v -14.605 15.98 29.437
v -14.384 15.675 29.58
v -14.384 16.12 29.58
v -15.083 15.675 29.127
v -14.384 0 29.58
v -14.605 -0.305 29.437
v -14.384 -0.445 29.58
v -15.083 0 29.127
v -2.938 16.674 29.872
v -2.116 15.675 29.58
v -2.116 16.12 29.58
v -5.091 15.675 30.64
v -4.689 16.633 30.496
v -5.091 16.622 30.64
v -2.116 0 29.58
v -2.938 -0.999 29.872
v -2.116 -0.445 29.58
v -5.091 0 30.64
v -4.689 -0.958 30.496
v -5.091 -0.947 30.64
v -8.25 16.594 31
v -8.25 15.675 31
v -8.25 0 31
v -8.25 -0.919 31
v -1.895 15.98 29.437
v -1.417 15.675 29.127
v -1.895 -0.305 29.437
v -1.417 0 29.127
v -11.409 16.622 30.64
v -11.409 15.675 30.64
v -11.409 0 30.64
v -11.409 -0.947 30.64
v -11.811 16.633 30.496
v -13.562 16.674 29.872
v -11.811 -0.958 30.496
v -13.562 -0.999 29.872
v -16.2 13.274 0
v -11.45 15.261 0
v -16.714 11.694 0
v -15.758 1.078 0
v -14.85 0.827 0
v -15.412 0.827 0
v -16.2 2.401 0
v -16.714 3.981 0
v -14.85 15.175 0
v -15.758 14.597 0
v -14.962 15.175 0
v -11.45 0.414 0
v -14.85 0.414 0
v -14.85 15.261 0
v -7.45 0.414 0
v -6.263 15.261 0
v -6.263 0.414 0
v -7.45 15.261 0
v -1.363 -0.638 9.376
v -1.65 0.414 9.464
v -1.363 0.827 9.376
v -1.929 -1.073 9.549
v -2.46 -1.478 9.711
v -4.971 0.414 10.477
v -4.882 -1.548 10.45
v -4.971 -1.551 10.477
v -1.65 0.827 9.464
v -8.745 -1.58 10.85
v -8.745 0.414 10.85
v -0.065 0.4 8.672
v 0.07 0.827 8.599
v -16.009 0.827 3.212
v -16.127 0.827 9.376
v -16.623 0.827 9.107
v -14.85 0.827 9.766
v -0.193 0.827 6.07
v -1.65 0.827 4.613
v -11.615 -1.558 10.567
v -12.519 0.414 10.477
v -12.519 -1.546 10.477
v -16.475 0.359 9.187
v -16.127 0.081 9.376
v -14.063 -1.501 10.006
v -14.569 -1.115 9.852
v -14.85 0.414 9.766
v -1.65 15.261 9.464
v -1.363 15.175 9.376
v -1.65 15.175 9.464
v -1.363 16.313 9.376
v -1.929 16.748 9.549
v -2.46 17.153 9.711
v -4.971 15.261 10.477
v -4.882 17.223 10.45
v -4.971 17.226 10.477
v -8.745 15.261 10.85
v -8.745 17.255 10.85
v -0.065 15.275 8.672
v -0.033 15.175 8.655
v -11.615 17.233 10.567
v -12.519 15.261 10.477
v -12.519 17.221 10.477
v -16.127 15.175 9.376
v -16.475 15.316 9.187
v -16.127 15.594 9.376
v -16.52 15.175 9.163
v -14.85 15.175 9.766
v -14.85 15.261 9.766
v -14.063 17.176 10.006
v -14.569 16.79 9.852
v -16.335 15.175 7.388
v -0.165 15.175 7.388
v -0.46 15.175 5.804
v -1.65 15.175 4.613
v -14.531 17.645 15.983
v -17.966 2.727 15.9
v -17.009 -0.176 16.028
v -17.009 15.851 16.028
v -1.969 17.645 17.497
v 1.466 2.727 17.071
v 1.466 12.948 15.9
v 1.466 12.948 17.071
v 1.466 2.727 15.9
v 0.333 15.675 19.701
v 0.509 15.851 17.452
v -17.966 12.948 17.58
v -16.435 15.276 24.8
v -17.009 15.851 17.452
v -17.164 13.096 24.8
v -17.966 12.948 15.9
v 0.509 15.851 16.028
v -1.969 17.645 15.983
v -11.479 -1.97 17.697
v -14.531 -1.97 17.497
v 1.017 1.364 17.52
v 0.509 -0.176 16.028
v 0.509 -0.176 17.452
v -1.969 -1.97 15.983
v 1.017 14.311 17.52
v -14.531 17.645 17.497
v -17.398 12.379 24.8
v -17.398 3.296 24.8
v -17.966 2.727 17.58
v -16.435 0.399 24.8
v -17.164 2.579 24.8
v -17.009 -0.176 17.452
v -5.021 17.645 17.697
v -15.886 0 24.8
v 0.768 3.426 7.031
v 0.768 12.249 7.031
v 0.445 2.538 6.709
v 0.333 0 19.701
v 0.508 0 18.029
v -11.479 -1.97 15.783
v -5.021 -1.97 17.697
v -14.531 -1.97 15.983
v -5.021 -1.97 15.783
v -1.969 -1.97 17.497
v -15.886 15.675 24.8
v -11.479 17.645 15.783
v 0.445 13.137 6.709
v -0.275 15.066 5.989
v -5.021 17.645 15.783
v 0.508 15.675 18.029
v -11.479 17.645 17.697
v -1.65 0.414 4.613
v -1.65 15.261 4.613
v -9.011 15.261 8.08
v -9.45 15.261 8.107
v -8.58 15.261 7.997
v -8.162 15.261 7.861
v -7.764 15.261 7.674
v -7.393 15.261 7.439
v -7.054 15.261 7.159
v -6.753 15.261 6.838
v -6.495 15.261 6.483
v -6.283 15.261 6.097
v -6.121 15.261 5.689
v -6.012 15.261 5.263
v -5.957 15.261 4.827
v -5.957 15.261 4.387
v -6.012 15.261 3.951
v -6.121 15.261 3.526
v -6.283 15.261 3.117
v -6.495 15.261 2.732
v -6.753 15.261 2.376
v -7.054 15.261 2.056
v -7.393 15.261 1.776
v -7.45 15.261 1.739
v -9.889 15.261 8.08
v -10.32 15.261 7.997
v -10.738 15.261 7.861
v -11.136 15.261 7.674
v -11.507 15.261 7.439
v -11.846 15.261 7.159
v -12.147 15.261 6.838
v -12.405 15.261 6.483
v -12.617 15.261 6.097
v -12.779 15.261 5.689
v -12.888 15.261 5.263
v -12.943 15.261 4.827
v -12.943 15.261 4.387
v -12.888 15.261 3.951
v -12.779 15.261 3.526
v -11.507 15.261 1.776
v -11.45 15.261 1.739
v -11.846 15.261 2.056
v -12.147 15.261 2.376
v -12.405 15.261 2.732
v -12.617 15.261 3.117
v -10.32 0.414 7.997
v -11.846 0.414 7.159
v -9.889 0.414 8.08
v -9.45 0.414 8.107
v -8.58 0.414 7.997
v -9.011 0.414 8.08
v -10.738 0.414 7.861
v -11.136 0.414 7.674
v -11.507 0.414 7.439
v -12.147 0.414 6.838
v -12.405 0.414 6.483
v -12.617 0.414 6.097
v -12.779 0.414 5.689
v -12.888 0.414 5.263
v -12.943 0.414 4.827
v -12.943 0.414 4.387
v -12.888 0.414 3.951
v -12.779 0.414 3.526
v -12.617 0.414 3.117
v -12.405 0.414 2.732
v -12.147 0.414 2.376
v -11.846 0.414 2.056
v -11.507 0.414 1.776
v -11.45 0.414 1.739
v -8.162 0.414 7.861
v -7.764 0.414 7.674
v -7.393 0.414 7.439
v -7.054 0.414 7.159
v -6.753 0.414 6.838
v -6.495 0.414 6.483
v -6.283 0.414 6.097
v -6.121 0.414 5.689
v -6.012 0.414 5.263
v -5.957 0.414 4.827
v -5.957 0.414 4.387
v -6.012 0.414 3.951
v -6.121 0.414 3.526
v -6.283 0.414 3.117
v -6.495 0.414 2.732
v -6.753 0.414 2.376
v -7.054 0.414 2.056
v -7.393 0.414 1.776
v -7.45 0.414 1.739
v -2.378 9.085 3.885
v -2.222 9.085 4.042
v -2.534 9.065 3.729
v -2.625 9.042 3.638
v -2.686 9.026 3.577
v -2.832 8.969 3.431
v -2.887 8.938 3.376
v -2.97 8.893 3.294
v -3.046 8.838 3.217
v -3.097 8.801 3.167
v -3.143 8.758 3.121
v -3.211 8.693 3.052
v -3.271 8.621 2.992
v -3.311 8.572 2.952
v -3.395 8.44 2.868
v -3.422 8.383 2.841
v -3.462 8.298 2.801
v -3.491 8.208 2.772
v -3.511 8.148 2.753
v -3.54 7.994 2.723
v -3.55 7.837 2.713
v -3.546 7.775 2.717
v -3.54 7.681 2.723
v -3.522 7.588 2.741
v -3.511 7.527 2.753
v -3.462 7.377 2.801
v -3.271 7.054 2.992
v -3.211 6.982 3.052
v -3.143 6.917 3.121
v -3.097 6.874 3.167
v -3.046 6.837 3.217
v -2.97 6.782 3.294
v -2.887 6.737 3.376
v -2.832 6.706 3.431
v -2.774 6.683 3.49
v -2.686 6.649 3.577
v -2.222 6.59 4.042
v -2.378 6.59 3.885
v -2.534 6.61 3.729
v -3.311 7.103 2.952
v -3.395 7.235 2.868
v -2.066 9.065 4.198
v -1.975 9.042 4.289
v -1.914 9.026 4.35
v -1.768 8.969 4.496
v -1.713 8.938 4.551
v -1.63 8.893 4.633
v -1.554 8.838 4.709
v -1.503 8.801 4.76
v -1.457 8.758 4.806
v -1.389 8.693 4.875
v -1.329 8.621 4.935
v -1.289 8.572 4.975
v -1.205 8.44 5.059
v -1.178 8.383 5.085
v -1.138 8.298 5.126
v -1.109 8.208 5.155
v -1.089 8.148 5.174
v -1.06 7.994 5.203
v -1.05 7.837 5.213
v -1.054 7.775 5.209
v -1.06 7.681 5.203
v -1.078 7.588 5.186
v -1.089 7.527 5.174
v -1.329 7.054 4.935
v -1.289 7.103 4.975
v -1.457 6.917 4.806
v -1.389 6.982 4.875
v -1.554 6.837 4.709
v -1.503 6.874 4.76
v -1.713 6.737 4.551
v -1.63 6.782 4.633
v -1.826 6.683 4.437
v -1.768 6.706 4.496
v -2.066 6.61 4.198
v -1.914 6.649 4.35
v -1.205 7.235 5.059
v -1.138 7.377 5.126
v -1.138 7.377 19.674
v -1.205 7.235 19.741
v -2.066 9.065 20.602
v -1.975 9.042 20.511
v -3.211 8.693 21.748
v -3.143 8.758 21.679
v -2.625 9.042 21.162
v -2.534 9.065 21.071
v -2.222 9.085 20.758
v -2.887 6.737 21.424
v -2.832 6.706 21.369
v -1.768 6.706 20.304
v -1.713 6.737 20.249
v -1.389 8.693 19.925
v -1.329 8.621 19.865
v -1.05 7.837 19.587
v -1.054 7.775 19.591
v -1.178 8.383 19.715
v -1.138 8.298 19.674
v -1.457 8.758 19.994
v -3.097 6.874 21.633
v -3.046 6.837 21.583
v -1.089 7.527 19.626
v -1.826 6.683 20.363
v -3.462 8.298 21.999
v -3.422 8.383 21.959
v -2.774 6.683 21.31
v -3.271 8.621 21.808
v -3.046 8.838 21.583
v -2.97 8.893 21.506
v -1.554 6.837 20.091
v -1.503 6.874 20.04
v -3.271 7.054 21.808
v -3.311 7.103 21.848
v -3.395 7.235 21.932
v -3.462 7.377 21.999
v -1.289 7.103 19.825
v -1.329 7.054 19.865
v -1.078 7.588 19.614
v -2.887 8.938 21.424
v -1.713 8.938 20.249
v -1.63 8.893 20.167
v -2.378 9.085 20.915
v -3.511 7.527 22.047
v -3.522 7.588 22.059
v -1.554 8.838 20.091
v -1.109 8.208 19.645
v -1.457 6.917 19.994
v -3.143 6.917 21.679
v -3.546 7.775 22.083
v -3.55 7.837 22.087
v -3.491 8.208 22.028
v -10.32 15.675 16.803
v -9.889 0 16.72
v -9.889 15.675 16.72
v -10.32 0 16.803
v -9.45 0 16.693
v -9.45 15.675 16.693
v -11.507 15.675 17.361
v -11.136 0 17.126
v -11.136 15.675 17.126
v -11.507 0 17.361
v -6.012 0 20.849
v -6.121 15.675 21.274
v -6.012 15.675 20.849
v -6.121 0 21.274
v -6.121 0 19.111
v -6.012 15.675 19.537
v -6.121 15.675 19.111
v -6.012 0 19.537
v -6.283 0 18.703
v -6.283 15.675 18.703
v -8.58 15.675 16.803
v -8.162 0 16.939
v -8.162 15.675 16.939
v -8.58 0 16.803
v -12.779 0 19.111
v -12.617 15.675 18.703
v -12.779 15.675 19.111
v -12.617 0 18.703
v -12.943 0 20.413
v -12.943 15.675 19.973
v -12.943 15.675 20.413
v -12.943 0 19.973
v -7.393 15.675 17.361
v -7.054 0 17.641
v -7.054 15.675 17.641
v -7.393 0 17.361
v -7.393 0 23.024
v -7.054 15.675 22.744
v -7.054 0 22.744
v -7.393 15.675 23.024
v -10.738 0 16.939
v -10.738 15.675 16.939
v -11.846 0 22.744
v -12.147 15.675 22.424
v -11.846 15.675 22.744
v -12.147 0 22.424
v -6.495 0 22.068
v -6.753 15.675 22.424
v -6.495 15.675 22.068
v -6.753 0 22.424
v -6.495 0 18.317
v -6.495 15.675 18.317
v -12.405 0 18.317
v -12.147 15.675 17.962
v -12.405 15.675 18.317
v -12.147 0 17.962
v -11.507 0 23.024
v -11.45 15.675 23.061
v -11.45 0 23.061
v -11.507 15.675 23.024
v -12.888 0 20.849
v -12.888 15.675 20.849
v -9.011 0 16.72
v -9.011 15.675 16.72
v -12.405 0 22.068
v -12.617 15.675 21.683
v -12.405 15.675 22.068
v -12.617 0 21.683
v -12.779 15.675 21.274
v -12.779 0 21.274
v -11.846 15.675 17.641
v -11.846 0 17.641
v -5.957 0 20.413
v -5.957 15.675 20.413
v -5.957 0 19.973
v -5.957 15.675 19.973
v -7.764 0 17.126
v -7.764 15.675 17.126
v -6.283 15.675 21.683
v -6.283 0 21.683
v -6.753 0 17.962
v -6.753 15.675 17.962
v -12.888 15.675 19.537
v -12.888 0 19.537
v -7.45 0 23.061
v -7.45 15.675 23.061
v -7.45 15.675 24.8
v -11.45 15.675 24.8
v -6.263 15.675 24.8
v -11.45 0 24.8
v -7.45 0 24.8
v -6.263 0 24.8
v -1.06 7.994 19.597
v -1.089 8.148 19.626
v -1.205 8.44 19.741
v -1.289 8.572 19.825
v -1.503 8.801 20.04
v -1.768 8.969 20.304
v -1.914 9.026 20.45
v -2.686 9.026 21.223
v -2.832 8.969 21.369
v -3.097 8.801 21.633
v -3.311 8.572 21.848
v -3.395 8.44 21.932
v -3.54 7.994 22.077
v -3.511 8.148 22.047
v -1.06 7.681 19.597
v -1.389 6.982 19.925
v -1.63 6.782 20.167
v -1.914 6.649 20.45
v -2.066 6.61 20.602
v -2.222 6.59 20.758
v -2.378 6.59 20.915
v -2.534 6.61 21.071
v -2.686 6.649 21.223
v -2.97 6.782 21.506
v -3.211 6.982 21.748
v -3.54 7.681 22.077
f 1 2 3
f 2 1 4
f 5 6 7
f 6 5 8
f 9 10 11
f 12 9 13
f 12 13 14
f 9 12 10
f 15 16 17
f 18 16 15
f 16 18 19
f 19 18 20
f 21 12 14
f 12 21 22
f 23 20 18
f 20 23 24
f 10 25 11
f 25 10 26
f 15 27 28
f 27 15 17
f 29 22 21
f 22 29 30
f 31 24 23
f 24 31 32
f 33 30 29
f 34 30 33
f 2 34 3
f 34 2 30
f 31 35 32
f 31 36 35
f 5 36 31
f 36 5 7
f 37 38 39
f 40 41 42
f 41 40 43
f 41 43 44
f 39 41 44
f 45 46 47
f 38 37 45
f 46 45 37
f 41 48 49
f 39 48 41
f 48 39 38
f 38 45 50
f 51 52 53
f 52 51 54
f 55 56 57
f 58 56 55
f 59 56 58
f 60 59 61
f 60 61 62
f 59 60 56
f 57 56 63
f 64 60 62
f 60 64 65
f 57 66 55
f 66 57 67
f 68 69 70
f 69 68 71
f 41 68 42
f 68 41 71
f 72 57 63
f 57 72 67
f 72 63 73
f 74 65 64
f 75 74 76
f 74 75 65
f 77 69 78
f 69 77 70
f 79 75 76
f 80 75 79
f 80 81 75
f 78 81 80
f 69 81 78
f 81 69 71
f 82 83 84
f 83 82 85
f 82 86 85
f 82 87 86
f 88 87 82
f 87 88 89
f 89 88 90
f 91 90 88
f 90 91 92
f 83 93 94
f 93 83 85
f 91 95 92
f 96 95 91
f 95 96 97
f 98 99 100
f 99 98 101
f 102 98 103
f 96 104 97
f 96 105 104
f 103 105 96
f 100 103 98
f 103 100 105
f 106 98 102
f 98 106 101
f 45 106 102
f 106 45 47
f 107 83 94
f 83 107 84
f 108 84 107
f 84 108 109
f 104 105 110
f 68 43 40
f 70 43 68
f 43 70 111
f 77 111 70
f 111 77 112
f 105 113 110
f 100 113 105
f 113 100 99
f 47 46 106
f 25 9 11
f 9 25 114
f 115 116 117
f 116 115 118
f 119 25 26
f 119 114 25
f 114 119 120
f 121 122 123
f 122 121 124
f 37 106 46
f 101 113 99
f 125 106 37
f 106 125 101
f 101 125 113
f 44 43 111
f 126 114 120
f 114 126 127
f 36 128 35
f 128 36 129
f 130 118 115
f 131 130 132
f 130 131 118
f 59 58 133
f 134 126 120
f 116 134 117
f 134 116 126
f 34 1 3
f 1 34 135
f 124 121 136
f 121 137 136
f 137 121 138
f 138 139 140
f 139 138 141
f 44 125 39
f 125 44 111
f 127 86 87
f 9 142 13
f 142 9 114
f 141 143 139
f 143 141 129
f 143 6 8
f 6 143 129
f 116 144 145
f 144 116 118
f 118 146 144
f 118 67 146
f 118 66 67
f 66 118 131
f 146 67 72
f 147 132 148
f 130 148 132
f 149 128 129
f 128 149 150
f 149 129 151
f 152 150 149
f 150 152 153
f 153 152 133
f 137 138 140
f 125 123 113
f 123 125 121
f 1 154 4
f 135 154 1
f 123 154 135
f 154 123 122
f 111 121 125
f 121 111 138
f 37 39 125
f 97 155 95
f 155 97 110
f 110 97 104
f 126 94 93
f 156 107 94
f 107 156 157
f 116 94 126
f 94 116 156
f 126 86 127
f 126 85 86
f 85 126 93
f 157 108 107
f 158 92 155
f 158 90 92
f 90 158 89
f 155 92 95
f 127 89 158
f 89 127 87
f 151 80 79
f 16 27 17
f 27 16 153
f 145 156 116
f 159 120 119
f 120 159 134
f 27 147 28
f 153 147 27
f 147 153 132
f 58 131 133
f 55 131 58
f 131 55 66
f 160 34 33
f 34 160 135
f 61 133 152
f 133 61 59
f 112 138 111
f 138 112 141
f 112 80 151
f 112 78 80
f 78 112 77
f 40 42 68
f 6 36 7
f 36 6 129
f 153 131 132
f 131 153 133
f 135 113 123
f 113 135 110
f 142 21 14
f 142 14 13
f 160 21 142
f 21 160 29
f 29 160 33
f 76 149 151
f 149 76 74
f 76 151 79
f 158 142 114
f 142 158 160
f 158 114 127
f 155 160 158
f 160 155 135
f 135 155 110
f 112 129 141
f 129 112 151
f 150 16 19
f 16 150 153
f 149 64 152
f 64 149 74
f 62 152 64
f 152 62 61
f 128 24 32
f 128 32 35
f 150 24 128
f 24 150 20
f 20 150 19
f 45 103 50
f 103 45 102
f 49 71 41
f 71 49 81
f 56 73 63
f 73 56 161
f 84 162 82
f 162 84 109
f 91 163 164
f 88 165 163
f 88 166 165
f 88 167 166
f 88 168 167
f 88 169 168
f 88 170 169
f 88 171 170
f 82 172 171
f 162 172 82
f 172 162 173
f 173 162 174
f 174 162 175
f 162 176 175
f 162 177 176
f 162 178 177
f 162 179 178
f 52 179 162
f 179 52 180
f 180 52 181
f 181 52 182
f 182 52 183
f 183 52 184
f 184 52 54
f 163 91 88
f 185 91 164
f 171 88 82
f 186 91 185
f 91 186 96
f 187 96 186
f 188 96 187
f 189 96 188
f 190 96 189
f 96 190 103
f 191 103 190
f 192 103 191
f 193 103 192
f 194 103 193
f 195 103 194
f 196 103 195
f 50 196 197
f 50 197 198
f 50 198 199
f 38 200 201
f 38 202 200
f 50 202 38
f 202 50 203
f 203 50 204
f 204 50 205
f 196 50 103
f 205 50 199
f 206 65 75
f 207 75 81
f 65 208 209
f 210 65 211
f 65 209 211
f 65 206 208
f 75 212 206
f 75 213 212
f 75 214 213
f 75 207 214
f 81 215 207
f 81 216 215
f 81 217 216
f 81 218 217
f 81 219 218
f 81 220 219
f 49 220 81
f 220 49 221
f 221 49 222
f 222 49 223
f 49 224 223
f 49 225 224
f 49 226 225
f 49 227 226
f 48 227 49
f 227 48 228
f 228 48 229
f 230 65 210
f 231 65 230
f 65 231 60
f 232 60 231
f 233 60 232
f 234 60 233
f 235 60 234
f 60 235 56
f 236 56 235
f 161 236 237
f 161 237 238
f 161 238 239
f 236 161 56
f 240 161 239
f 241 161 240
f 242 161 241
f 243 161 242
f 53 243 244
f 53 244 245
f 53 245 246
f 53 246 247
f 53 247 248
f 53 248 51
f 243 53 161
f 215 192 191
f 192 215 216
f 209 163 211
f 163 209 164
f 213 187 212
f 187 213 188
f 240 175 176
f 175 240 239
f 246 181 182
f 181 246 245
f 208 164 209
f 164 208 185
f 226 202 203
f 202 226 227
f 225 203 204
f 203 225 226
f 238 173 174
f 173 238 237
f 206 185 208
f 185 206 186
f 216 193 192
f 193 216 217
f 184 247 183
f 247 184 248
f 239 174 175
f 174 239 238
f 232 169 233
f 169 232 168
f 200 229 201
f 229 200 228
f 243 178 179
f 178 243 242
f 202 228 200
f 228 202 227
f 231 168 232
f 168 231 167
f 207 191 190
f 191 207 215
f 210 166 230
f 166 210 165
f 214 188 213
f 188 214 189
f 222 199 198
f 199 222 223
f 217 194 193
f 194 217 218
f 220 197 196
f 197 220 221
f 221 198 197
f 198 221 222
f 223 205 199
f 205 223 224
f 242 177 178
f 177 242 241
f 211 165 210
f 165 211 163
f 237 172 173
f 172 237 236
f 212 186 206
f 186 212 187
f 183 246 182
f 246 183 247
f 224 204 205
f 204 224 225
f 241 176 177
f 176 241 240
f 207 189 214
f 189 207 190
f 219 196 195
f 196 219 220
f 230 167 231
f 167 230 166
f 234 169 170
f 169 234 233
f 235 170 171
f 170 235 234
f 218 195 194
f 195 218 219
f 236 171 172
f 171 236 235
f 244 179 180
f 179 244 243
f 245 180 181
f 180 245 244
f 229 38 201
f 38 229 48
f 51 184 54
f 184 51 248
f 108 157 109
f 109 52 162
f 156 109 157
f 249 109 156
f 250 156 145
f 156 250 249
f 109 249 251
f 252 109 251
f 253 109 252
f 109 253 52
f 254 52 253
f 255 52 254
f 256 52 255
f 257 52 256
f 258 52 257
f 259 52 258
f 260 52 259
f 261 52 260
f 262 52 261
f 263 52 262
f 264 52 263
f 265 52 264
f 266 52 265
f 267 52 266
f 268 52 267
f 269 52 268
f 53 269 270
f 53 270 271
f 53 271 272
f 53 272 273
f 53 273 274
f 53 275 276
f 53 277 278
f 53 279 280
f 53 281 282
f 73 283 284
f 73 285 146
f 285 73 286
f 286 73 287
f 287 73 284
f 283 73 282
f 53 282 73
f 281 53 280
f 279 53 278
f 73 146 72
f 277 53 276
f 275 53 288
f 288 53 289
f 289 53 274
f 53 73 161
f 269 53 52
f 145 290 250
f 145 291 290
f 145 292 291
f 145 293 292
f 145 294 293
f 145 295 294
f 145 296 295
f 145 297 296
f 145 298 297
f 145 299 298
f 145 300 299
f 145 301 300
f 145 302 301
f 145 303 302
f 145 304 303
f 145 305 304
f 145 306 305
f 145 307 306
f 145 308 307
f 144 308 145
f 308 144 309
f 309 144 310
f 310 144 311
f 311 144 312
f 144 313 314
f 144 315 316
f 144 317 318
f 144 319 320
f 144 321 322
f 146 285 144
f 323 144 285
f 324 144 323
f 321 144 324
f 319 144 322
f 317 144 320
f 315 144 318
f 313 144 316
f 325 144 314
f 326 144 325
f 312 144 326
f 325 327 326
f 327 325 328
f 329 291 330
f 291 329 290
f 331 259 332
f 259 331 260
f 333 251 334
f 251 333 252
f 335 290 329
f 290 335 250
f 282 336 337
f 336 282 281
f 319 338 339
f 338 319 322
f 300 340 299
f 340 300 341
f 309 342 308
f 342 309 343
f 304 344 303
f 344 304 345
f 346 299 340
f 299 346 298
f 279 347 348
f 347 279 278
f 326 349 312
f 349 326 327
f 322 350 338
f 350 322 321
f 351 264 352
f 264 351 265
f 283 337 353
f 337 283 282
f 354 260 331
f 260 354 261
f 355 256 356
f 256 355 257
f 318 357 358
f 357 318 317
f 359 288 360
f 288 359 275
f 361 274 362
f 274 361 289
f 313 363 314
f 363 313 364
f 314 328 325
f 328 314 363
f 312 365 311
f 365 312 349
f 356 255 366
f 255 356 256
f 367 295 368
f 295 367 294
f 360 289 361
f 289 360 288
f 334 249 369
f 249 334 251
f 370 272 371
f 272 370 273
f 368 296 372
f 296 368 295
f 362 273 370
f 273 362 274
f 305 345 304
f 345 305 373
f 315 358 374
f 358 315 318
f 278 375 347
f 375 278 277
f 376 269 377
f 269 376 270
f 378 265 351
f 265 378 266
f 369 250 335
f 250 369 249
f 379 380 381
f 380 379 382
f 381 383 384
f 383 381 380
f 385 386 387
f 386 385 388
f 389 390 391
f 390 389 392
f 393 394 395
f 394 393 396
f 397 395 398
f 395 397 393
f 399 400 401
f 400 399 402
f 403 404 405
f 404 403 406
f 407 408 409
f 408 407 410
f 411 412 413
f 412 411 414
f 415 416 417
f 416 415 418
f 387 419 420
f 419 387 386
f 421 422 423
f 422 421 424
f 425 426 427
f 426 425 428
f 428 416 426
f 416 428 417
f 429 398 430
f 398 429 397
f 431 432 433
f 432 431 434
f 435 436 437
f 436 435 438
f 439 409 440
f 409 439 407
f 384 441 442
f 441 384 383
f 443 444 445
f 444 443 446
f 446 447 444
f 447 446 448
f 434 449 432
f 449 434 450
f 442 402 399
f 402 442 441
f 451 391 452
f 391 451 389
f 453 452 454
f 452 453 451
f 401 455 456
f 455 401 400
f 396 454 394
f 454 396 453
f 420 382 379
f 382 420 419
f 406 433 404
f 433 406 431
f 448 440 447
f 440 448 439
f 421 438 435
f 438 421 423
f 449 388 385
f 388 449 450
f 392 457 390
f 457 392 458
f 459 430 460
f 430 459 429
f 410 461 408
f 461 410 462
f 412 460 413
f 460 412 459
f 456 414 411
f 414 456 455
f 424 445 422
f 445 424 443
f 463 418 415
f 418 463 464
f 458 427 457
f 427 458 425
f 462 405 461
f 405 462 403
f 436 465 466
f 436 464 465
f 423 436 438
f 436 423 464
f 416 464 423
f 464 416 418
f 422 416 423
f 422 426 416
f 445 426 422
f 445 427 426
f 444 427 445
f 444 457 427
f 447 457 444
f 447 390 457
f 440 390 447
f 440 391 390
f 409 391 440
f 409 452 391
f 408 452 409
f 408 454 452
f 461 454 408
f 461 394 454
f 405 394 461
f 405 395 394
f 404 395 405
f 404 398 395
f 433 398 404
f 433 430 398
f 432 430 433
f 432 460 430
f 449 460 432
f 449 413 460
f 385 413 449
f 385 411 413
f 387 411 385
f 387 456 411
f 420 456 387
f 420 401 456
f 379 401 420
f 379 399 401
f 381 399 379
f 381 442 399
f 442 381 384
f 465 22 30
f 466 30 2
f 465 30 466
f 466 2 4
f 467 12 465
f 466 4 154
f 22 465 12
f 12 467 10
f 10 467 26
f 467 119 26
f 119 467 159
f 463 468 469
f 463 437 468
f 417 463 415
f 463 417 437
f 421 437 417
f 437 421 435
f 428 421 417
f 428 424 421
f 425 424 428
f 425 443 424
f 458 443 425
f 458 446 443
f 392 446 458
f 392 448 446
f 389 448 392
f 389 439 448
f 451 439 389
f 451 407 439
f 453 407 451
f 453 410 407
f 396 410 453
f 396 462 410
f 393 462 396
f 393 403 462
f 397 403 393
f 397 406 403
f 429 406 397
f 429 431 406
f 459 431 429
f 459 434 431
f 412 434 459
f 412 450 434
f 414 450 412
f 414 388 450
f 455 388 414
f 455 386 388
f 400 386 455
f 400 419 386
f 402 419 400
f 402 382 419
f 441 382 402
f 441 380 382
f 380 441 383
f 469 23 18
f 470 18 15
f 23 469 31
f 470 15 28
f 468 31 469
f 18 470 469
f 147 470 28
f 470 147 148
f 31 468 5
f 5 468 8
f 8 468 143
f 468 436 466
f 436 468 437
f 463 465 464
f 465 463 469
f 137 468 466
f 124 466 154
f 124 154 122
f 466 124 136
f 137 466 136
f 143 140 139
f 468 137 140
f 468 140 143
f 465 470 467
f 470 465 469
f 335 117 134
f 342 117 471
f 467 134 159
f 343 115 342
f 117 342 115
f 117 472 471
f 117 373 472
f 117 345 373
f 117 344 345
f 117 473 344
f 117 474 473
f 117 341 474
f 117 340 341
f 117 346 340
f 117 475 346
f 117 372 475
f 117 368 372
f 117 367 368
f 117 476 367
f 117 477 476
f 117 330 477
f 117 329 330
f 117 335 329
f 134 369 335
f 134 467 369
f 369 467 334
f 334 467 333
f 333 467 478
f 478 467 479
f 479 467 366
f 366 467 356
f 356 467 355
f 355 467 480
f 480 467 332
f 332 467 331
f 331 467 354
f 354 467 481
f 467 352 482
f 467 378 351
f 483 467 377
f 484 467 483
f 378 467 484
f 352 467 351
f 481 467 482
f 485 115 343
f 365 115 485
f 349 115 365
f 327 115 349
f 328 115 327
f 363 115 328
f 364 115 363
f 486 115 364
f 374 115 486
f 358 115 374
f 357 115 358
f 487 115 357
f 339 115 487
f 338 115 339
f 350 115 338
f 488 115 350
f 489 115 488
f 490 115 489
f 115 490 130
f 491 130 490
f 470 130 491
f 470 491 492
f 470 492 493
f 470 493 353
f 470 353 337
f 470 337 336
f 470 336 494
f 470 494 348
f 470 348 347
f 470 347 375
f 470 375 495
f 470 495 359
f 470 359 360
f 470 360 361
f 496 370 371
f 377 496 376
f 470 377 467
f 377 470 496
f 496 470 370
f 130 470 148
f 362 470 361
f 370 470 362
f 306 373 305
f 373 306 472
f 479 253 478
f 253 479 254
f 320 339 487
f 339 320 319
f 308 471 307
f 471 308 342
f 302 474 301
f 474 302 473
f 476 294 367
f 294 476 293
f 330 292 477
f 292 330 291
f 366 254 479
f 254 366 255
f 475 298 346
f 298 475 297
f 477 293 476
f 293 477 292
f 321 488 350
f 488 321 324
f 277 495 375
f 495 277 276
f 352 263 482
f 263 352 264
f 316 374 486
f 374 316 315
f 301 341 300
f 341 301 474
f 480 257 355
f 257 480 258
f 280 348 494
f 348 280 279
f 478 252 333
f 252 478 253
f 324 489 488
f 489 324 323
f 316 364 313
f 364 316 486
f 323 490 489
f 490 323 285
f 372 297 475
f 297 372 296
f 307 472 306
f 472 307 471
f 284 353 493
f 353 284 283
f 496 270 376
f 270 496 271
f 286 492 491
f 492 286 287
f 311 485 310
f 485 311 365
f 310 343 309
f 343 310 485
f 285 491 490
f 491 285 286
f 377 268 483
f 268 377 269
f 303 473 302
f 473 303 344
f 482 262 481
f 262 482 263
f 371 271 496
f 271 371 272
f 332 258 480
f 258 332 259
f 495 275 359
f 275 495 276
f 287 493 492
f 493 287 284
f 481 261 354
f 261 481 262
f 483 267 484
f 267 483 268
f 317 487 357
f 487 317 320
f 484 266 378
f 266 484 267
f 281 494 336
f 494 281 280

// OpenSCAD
// file: util/finger_base.scad
include <../../config.scad>

rotate([0,-90,0]) fingerbase();

//	Base segment of finger, can be lengthened
module fingerbase(length=20, proximalHole=true, distalHole=true)
{
	difference() {
		scale([yScaleFactor,xScaleFactor,zScaleFactor]) {
			fingerbasesolid(length);
		}
		if(proximalHole) {
			translate([0,knucklePadding/2 * xScaleFactor,0]) fingerhardwarecutouts(jointDia, jointThick, knuckleW=knuckleW-knucklePadding, fingerLen=length);
		}
		if (distalHole) {
			translate([length * yScaleFactor,0,0]) mirror([1,0,0]) fingerhardwarecutouts(jointDia, jointThick, knuckleW=knuckleW, fingerLen=length);
		}
	}


	
}

module fingerhardwarecutouts(jointDia,jointThick,knuckleW,fingerLen,holeCutoff=100) {
	//slot for flex joint
	translate([7 - (15/jointDia),0,6*zScaleFactor - (1.8/jointThick)]) {
		rotate([90,0,0]) translate([-0.25,0,-knuckleW*xScaleFactor]) cylinder(d=jointDia, h=knuckleW*xScaleFactor, $fn=50);
		translate([-25,(knuckleW*xScaleFactor) / 2,0]) cube([50,knuckleW*xScaleFactor,jointThick], center=true);
	}
	//cubic parts
	translate([-100,0,0]) cube([100,knuckleW*xScaleFactor,100]);
	translate([-13/zScaleFactor,0,0]) rotate([0,45,0]) translate([-50,0,0]) cube([100,knuckleW * xScaleFactor, 10]);

	//channel for string/tendon
	translate([-fingerLen/2 * yScaleFactor, knuckleW/2 * xScaleFactor, 2.3]) rotate([0,90,0]) cylinder(d=2.5, h=holeCutoff, $fn=50);
}

//	base segment of finger, solid
module fingerbasesolid(length=50, cutout=true) {
	difference() {
		//cubic part
		translate([0,0.001 + knucklePadding/2,1]) cube([length, knuckleW - knucklePadding - 0.002, 8]);
	}
	
	//cylindrical-ish part around finger
	intersection() {
		//overly large shape to get the cross section in the XZ plane from
		difference() {
			union() {
				translate([length-4,-5,5]) rotate([-90,0,0]) cylinder(r=8,h=knuckleW + 10);
				translate([0,-5,-5]) cube([length,knuckleW + 10,20]);
			}
			//cutout for the side "guards" of the previous knuckle
			if(cutout) {
				translate([-4,-knuckleW+0.001,5.3]) rotate([-90,0,0]) cylinder(r=11,h=10);
				translate([-4,knuckleW - knucklePadding*(1/xScaleFactor),5.3]) rotate([-90,0,0]) cylinder(r=11,h=10);
			}
		}

		hull() {
			for(i=[-1,1], j=[-1,1]) {
				//angled cylinders to provide the outer shape of the finger
				translate([length/10,i*2.4 + knuckleW/2,j*2.2 + 5]) rotate([i*j*-4,j*86,0]) cylinder(d=6,h=20,center=true);
				translate([length+4, i*2.4 + knuckleW/2, j*2.2 + 5]) rotate([i*j*-4,j*-86,0]) cylinder(d=6,h=20,center=true);
			}
		}
	}
}
// file: ../config.scad
/**
 * Configuration settings for Flexy Beast, required to generate correctly sized STLs of the printed parts. See the Configuration File Assembly instructions to set this up.
 * @id config_file
 * @name Configuration File
 * @category Prerequisites!
 * @step Open config.scad in your favorite text editor.
 * @step As per the normal Cyborg Beast instructions, measure the width of the knuckles in the non-affected hand and convert to millimeters.
 * @step Add 5 to that result and then divide by 55.
 * @step Replace the x-, y-, and zScaleFactor variables in config.scad with that number.
 * @step If desired, adjust the proportions of the hand by changing those variables individually. xScaleFactor controls the width of the hand, yScaleFactor controls the length, and zScaleFactor controls the height.
 * @step Open assembly.scad in OpenSCAD to check that the flexy joint holes are not too large for the hand (should only be necessary for small children). If necessary, reduce the jointDia and jointThick variables. jointDia=5 and jointThick=2 is a good amount for smaller hands.
 * @step Set the fingerPads variable to true or false depending on whether you want to cast silicone finger pads for improved grip.
 * @step Open palm.scad, finger_base.scad, finger_tip.scad, and thumb_tip.scad in OpenSCAD, render each part (F6), and export as STL, then print. Suggested print settings are 0.2mm or smaller layer height, 3 perimeters, and 25% rectilinear or hexagonal infill.
 */

knuckleR = 4.85;
knucklePadding = 0.5;
knuckleW = 9.5;
wristH = 10;
palmH = 20;
palmW = 64;
th = 3;
fn = 32;

//flexy joint parameters
jointDia = 7;
jointThick = 4;

//finger settings
fingerPads = true; //whether or not to hollow the finger tips slightly for molding pads
fingerLength = 1; //multiply the length of all fingers by this amount
thumbProp = 0.8; //proportion of thumb length relative to other fingers (note that the thumb is a segment shorter than the other fingers already)
indexProp = 0.8; //proportion of index finger length relative to other fingers
middleProp = 1; //proportion of middle finger length relative to other fingers
ringProp = 0.8; //proportion of ring finger length relative to other fingers
pinkyProp = 0.7; //proportion of pinky finger length relative to other fingers

//misc settings
thermoform = true; //whether or not to generate a thermoformable mesh for the palm

//desired scale factor for hand based on the standard Cyborg Beast/Robohand sizing guide
xScaleFactor = 1.65; // [1.05:1.60]
yScaleFactor = 1.55; // [1.05:1.60]
zScaleFactor = 1.65; // [1.05:1.60]
// main file
include <../config.scad>
use <util/finger_base.scad>

rotate([0,-90,0]) fingerbase(length = 20 * thumbProp * fingerLength);

/**
 * Proximal phalanx for thumb - rendered from parts/thumb_base.scad
 * @id thumb_base
 * @name Thumb Base
 * @category Printed
 */
